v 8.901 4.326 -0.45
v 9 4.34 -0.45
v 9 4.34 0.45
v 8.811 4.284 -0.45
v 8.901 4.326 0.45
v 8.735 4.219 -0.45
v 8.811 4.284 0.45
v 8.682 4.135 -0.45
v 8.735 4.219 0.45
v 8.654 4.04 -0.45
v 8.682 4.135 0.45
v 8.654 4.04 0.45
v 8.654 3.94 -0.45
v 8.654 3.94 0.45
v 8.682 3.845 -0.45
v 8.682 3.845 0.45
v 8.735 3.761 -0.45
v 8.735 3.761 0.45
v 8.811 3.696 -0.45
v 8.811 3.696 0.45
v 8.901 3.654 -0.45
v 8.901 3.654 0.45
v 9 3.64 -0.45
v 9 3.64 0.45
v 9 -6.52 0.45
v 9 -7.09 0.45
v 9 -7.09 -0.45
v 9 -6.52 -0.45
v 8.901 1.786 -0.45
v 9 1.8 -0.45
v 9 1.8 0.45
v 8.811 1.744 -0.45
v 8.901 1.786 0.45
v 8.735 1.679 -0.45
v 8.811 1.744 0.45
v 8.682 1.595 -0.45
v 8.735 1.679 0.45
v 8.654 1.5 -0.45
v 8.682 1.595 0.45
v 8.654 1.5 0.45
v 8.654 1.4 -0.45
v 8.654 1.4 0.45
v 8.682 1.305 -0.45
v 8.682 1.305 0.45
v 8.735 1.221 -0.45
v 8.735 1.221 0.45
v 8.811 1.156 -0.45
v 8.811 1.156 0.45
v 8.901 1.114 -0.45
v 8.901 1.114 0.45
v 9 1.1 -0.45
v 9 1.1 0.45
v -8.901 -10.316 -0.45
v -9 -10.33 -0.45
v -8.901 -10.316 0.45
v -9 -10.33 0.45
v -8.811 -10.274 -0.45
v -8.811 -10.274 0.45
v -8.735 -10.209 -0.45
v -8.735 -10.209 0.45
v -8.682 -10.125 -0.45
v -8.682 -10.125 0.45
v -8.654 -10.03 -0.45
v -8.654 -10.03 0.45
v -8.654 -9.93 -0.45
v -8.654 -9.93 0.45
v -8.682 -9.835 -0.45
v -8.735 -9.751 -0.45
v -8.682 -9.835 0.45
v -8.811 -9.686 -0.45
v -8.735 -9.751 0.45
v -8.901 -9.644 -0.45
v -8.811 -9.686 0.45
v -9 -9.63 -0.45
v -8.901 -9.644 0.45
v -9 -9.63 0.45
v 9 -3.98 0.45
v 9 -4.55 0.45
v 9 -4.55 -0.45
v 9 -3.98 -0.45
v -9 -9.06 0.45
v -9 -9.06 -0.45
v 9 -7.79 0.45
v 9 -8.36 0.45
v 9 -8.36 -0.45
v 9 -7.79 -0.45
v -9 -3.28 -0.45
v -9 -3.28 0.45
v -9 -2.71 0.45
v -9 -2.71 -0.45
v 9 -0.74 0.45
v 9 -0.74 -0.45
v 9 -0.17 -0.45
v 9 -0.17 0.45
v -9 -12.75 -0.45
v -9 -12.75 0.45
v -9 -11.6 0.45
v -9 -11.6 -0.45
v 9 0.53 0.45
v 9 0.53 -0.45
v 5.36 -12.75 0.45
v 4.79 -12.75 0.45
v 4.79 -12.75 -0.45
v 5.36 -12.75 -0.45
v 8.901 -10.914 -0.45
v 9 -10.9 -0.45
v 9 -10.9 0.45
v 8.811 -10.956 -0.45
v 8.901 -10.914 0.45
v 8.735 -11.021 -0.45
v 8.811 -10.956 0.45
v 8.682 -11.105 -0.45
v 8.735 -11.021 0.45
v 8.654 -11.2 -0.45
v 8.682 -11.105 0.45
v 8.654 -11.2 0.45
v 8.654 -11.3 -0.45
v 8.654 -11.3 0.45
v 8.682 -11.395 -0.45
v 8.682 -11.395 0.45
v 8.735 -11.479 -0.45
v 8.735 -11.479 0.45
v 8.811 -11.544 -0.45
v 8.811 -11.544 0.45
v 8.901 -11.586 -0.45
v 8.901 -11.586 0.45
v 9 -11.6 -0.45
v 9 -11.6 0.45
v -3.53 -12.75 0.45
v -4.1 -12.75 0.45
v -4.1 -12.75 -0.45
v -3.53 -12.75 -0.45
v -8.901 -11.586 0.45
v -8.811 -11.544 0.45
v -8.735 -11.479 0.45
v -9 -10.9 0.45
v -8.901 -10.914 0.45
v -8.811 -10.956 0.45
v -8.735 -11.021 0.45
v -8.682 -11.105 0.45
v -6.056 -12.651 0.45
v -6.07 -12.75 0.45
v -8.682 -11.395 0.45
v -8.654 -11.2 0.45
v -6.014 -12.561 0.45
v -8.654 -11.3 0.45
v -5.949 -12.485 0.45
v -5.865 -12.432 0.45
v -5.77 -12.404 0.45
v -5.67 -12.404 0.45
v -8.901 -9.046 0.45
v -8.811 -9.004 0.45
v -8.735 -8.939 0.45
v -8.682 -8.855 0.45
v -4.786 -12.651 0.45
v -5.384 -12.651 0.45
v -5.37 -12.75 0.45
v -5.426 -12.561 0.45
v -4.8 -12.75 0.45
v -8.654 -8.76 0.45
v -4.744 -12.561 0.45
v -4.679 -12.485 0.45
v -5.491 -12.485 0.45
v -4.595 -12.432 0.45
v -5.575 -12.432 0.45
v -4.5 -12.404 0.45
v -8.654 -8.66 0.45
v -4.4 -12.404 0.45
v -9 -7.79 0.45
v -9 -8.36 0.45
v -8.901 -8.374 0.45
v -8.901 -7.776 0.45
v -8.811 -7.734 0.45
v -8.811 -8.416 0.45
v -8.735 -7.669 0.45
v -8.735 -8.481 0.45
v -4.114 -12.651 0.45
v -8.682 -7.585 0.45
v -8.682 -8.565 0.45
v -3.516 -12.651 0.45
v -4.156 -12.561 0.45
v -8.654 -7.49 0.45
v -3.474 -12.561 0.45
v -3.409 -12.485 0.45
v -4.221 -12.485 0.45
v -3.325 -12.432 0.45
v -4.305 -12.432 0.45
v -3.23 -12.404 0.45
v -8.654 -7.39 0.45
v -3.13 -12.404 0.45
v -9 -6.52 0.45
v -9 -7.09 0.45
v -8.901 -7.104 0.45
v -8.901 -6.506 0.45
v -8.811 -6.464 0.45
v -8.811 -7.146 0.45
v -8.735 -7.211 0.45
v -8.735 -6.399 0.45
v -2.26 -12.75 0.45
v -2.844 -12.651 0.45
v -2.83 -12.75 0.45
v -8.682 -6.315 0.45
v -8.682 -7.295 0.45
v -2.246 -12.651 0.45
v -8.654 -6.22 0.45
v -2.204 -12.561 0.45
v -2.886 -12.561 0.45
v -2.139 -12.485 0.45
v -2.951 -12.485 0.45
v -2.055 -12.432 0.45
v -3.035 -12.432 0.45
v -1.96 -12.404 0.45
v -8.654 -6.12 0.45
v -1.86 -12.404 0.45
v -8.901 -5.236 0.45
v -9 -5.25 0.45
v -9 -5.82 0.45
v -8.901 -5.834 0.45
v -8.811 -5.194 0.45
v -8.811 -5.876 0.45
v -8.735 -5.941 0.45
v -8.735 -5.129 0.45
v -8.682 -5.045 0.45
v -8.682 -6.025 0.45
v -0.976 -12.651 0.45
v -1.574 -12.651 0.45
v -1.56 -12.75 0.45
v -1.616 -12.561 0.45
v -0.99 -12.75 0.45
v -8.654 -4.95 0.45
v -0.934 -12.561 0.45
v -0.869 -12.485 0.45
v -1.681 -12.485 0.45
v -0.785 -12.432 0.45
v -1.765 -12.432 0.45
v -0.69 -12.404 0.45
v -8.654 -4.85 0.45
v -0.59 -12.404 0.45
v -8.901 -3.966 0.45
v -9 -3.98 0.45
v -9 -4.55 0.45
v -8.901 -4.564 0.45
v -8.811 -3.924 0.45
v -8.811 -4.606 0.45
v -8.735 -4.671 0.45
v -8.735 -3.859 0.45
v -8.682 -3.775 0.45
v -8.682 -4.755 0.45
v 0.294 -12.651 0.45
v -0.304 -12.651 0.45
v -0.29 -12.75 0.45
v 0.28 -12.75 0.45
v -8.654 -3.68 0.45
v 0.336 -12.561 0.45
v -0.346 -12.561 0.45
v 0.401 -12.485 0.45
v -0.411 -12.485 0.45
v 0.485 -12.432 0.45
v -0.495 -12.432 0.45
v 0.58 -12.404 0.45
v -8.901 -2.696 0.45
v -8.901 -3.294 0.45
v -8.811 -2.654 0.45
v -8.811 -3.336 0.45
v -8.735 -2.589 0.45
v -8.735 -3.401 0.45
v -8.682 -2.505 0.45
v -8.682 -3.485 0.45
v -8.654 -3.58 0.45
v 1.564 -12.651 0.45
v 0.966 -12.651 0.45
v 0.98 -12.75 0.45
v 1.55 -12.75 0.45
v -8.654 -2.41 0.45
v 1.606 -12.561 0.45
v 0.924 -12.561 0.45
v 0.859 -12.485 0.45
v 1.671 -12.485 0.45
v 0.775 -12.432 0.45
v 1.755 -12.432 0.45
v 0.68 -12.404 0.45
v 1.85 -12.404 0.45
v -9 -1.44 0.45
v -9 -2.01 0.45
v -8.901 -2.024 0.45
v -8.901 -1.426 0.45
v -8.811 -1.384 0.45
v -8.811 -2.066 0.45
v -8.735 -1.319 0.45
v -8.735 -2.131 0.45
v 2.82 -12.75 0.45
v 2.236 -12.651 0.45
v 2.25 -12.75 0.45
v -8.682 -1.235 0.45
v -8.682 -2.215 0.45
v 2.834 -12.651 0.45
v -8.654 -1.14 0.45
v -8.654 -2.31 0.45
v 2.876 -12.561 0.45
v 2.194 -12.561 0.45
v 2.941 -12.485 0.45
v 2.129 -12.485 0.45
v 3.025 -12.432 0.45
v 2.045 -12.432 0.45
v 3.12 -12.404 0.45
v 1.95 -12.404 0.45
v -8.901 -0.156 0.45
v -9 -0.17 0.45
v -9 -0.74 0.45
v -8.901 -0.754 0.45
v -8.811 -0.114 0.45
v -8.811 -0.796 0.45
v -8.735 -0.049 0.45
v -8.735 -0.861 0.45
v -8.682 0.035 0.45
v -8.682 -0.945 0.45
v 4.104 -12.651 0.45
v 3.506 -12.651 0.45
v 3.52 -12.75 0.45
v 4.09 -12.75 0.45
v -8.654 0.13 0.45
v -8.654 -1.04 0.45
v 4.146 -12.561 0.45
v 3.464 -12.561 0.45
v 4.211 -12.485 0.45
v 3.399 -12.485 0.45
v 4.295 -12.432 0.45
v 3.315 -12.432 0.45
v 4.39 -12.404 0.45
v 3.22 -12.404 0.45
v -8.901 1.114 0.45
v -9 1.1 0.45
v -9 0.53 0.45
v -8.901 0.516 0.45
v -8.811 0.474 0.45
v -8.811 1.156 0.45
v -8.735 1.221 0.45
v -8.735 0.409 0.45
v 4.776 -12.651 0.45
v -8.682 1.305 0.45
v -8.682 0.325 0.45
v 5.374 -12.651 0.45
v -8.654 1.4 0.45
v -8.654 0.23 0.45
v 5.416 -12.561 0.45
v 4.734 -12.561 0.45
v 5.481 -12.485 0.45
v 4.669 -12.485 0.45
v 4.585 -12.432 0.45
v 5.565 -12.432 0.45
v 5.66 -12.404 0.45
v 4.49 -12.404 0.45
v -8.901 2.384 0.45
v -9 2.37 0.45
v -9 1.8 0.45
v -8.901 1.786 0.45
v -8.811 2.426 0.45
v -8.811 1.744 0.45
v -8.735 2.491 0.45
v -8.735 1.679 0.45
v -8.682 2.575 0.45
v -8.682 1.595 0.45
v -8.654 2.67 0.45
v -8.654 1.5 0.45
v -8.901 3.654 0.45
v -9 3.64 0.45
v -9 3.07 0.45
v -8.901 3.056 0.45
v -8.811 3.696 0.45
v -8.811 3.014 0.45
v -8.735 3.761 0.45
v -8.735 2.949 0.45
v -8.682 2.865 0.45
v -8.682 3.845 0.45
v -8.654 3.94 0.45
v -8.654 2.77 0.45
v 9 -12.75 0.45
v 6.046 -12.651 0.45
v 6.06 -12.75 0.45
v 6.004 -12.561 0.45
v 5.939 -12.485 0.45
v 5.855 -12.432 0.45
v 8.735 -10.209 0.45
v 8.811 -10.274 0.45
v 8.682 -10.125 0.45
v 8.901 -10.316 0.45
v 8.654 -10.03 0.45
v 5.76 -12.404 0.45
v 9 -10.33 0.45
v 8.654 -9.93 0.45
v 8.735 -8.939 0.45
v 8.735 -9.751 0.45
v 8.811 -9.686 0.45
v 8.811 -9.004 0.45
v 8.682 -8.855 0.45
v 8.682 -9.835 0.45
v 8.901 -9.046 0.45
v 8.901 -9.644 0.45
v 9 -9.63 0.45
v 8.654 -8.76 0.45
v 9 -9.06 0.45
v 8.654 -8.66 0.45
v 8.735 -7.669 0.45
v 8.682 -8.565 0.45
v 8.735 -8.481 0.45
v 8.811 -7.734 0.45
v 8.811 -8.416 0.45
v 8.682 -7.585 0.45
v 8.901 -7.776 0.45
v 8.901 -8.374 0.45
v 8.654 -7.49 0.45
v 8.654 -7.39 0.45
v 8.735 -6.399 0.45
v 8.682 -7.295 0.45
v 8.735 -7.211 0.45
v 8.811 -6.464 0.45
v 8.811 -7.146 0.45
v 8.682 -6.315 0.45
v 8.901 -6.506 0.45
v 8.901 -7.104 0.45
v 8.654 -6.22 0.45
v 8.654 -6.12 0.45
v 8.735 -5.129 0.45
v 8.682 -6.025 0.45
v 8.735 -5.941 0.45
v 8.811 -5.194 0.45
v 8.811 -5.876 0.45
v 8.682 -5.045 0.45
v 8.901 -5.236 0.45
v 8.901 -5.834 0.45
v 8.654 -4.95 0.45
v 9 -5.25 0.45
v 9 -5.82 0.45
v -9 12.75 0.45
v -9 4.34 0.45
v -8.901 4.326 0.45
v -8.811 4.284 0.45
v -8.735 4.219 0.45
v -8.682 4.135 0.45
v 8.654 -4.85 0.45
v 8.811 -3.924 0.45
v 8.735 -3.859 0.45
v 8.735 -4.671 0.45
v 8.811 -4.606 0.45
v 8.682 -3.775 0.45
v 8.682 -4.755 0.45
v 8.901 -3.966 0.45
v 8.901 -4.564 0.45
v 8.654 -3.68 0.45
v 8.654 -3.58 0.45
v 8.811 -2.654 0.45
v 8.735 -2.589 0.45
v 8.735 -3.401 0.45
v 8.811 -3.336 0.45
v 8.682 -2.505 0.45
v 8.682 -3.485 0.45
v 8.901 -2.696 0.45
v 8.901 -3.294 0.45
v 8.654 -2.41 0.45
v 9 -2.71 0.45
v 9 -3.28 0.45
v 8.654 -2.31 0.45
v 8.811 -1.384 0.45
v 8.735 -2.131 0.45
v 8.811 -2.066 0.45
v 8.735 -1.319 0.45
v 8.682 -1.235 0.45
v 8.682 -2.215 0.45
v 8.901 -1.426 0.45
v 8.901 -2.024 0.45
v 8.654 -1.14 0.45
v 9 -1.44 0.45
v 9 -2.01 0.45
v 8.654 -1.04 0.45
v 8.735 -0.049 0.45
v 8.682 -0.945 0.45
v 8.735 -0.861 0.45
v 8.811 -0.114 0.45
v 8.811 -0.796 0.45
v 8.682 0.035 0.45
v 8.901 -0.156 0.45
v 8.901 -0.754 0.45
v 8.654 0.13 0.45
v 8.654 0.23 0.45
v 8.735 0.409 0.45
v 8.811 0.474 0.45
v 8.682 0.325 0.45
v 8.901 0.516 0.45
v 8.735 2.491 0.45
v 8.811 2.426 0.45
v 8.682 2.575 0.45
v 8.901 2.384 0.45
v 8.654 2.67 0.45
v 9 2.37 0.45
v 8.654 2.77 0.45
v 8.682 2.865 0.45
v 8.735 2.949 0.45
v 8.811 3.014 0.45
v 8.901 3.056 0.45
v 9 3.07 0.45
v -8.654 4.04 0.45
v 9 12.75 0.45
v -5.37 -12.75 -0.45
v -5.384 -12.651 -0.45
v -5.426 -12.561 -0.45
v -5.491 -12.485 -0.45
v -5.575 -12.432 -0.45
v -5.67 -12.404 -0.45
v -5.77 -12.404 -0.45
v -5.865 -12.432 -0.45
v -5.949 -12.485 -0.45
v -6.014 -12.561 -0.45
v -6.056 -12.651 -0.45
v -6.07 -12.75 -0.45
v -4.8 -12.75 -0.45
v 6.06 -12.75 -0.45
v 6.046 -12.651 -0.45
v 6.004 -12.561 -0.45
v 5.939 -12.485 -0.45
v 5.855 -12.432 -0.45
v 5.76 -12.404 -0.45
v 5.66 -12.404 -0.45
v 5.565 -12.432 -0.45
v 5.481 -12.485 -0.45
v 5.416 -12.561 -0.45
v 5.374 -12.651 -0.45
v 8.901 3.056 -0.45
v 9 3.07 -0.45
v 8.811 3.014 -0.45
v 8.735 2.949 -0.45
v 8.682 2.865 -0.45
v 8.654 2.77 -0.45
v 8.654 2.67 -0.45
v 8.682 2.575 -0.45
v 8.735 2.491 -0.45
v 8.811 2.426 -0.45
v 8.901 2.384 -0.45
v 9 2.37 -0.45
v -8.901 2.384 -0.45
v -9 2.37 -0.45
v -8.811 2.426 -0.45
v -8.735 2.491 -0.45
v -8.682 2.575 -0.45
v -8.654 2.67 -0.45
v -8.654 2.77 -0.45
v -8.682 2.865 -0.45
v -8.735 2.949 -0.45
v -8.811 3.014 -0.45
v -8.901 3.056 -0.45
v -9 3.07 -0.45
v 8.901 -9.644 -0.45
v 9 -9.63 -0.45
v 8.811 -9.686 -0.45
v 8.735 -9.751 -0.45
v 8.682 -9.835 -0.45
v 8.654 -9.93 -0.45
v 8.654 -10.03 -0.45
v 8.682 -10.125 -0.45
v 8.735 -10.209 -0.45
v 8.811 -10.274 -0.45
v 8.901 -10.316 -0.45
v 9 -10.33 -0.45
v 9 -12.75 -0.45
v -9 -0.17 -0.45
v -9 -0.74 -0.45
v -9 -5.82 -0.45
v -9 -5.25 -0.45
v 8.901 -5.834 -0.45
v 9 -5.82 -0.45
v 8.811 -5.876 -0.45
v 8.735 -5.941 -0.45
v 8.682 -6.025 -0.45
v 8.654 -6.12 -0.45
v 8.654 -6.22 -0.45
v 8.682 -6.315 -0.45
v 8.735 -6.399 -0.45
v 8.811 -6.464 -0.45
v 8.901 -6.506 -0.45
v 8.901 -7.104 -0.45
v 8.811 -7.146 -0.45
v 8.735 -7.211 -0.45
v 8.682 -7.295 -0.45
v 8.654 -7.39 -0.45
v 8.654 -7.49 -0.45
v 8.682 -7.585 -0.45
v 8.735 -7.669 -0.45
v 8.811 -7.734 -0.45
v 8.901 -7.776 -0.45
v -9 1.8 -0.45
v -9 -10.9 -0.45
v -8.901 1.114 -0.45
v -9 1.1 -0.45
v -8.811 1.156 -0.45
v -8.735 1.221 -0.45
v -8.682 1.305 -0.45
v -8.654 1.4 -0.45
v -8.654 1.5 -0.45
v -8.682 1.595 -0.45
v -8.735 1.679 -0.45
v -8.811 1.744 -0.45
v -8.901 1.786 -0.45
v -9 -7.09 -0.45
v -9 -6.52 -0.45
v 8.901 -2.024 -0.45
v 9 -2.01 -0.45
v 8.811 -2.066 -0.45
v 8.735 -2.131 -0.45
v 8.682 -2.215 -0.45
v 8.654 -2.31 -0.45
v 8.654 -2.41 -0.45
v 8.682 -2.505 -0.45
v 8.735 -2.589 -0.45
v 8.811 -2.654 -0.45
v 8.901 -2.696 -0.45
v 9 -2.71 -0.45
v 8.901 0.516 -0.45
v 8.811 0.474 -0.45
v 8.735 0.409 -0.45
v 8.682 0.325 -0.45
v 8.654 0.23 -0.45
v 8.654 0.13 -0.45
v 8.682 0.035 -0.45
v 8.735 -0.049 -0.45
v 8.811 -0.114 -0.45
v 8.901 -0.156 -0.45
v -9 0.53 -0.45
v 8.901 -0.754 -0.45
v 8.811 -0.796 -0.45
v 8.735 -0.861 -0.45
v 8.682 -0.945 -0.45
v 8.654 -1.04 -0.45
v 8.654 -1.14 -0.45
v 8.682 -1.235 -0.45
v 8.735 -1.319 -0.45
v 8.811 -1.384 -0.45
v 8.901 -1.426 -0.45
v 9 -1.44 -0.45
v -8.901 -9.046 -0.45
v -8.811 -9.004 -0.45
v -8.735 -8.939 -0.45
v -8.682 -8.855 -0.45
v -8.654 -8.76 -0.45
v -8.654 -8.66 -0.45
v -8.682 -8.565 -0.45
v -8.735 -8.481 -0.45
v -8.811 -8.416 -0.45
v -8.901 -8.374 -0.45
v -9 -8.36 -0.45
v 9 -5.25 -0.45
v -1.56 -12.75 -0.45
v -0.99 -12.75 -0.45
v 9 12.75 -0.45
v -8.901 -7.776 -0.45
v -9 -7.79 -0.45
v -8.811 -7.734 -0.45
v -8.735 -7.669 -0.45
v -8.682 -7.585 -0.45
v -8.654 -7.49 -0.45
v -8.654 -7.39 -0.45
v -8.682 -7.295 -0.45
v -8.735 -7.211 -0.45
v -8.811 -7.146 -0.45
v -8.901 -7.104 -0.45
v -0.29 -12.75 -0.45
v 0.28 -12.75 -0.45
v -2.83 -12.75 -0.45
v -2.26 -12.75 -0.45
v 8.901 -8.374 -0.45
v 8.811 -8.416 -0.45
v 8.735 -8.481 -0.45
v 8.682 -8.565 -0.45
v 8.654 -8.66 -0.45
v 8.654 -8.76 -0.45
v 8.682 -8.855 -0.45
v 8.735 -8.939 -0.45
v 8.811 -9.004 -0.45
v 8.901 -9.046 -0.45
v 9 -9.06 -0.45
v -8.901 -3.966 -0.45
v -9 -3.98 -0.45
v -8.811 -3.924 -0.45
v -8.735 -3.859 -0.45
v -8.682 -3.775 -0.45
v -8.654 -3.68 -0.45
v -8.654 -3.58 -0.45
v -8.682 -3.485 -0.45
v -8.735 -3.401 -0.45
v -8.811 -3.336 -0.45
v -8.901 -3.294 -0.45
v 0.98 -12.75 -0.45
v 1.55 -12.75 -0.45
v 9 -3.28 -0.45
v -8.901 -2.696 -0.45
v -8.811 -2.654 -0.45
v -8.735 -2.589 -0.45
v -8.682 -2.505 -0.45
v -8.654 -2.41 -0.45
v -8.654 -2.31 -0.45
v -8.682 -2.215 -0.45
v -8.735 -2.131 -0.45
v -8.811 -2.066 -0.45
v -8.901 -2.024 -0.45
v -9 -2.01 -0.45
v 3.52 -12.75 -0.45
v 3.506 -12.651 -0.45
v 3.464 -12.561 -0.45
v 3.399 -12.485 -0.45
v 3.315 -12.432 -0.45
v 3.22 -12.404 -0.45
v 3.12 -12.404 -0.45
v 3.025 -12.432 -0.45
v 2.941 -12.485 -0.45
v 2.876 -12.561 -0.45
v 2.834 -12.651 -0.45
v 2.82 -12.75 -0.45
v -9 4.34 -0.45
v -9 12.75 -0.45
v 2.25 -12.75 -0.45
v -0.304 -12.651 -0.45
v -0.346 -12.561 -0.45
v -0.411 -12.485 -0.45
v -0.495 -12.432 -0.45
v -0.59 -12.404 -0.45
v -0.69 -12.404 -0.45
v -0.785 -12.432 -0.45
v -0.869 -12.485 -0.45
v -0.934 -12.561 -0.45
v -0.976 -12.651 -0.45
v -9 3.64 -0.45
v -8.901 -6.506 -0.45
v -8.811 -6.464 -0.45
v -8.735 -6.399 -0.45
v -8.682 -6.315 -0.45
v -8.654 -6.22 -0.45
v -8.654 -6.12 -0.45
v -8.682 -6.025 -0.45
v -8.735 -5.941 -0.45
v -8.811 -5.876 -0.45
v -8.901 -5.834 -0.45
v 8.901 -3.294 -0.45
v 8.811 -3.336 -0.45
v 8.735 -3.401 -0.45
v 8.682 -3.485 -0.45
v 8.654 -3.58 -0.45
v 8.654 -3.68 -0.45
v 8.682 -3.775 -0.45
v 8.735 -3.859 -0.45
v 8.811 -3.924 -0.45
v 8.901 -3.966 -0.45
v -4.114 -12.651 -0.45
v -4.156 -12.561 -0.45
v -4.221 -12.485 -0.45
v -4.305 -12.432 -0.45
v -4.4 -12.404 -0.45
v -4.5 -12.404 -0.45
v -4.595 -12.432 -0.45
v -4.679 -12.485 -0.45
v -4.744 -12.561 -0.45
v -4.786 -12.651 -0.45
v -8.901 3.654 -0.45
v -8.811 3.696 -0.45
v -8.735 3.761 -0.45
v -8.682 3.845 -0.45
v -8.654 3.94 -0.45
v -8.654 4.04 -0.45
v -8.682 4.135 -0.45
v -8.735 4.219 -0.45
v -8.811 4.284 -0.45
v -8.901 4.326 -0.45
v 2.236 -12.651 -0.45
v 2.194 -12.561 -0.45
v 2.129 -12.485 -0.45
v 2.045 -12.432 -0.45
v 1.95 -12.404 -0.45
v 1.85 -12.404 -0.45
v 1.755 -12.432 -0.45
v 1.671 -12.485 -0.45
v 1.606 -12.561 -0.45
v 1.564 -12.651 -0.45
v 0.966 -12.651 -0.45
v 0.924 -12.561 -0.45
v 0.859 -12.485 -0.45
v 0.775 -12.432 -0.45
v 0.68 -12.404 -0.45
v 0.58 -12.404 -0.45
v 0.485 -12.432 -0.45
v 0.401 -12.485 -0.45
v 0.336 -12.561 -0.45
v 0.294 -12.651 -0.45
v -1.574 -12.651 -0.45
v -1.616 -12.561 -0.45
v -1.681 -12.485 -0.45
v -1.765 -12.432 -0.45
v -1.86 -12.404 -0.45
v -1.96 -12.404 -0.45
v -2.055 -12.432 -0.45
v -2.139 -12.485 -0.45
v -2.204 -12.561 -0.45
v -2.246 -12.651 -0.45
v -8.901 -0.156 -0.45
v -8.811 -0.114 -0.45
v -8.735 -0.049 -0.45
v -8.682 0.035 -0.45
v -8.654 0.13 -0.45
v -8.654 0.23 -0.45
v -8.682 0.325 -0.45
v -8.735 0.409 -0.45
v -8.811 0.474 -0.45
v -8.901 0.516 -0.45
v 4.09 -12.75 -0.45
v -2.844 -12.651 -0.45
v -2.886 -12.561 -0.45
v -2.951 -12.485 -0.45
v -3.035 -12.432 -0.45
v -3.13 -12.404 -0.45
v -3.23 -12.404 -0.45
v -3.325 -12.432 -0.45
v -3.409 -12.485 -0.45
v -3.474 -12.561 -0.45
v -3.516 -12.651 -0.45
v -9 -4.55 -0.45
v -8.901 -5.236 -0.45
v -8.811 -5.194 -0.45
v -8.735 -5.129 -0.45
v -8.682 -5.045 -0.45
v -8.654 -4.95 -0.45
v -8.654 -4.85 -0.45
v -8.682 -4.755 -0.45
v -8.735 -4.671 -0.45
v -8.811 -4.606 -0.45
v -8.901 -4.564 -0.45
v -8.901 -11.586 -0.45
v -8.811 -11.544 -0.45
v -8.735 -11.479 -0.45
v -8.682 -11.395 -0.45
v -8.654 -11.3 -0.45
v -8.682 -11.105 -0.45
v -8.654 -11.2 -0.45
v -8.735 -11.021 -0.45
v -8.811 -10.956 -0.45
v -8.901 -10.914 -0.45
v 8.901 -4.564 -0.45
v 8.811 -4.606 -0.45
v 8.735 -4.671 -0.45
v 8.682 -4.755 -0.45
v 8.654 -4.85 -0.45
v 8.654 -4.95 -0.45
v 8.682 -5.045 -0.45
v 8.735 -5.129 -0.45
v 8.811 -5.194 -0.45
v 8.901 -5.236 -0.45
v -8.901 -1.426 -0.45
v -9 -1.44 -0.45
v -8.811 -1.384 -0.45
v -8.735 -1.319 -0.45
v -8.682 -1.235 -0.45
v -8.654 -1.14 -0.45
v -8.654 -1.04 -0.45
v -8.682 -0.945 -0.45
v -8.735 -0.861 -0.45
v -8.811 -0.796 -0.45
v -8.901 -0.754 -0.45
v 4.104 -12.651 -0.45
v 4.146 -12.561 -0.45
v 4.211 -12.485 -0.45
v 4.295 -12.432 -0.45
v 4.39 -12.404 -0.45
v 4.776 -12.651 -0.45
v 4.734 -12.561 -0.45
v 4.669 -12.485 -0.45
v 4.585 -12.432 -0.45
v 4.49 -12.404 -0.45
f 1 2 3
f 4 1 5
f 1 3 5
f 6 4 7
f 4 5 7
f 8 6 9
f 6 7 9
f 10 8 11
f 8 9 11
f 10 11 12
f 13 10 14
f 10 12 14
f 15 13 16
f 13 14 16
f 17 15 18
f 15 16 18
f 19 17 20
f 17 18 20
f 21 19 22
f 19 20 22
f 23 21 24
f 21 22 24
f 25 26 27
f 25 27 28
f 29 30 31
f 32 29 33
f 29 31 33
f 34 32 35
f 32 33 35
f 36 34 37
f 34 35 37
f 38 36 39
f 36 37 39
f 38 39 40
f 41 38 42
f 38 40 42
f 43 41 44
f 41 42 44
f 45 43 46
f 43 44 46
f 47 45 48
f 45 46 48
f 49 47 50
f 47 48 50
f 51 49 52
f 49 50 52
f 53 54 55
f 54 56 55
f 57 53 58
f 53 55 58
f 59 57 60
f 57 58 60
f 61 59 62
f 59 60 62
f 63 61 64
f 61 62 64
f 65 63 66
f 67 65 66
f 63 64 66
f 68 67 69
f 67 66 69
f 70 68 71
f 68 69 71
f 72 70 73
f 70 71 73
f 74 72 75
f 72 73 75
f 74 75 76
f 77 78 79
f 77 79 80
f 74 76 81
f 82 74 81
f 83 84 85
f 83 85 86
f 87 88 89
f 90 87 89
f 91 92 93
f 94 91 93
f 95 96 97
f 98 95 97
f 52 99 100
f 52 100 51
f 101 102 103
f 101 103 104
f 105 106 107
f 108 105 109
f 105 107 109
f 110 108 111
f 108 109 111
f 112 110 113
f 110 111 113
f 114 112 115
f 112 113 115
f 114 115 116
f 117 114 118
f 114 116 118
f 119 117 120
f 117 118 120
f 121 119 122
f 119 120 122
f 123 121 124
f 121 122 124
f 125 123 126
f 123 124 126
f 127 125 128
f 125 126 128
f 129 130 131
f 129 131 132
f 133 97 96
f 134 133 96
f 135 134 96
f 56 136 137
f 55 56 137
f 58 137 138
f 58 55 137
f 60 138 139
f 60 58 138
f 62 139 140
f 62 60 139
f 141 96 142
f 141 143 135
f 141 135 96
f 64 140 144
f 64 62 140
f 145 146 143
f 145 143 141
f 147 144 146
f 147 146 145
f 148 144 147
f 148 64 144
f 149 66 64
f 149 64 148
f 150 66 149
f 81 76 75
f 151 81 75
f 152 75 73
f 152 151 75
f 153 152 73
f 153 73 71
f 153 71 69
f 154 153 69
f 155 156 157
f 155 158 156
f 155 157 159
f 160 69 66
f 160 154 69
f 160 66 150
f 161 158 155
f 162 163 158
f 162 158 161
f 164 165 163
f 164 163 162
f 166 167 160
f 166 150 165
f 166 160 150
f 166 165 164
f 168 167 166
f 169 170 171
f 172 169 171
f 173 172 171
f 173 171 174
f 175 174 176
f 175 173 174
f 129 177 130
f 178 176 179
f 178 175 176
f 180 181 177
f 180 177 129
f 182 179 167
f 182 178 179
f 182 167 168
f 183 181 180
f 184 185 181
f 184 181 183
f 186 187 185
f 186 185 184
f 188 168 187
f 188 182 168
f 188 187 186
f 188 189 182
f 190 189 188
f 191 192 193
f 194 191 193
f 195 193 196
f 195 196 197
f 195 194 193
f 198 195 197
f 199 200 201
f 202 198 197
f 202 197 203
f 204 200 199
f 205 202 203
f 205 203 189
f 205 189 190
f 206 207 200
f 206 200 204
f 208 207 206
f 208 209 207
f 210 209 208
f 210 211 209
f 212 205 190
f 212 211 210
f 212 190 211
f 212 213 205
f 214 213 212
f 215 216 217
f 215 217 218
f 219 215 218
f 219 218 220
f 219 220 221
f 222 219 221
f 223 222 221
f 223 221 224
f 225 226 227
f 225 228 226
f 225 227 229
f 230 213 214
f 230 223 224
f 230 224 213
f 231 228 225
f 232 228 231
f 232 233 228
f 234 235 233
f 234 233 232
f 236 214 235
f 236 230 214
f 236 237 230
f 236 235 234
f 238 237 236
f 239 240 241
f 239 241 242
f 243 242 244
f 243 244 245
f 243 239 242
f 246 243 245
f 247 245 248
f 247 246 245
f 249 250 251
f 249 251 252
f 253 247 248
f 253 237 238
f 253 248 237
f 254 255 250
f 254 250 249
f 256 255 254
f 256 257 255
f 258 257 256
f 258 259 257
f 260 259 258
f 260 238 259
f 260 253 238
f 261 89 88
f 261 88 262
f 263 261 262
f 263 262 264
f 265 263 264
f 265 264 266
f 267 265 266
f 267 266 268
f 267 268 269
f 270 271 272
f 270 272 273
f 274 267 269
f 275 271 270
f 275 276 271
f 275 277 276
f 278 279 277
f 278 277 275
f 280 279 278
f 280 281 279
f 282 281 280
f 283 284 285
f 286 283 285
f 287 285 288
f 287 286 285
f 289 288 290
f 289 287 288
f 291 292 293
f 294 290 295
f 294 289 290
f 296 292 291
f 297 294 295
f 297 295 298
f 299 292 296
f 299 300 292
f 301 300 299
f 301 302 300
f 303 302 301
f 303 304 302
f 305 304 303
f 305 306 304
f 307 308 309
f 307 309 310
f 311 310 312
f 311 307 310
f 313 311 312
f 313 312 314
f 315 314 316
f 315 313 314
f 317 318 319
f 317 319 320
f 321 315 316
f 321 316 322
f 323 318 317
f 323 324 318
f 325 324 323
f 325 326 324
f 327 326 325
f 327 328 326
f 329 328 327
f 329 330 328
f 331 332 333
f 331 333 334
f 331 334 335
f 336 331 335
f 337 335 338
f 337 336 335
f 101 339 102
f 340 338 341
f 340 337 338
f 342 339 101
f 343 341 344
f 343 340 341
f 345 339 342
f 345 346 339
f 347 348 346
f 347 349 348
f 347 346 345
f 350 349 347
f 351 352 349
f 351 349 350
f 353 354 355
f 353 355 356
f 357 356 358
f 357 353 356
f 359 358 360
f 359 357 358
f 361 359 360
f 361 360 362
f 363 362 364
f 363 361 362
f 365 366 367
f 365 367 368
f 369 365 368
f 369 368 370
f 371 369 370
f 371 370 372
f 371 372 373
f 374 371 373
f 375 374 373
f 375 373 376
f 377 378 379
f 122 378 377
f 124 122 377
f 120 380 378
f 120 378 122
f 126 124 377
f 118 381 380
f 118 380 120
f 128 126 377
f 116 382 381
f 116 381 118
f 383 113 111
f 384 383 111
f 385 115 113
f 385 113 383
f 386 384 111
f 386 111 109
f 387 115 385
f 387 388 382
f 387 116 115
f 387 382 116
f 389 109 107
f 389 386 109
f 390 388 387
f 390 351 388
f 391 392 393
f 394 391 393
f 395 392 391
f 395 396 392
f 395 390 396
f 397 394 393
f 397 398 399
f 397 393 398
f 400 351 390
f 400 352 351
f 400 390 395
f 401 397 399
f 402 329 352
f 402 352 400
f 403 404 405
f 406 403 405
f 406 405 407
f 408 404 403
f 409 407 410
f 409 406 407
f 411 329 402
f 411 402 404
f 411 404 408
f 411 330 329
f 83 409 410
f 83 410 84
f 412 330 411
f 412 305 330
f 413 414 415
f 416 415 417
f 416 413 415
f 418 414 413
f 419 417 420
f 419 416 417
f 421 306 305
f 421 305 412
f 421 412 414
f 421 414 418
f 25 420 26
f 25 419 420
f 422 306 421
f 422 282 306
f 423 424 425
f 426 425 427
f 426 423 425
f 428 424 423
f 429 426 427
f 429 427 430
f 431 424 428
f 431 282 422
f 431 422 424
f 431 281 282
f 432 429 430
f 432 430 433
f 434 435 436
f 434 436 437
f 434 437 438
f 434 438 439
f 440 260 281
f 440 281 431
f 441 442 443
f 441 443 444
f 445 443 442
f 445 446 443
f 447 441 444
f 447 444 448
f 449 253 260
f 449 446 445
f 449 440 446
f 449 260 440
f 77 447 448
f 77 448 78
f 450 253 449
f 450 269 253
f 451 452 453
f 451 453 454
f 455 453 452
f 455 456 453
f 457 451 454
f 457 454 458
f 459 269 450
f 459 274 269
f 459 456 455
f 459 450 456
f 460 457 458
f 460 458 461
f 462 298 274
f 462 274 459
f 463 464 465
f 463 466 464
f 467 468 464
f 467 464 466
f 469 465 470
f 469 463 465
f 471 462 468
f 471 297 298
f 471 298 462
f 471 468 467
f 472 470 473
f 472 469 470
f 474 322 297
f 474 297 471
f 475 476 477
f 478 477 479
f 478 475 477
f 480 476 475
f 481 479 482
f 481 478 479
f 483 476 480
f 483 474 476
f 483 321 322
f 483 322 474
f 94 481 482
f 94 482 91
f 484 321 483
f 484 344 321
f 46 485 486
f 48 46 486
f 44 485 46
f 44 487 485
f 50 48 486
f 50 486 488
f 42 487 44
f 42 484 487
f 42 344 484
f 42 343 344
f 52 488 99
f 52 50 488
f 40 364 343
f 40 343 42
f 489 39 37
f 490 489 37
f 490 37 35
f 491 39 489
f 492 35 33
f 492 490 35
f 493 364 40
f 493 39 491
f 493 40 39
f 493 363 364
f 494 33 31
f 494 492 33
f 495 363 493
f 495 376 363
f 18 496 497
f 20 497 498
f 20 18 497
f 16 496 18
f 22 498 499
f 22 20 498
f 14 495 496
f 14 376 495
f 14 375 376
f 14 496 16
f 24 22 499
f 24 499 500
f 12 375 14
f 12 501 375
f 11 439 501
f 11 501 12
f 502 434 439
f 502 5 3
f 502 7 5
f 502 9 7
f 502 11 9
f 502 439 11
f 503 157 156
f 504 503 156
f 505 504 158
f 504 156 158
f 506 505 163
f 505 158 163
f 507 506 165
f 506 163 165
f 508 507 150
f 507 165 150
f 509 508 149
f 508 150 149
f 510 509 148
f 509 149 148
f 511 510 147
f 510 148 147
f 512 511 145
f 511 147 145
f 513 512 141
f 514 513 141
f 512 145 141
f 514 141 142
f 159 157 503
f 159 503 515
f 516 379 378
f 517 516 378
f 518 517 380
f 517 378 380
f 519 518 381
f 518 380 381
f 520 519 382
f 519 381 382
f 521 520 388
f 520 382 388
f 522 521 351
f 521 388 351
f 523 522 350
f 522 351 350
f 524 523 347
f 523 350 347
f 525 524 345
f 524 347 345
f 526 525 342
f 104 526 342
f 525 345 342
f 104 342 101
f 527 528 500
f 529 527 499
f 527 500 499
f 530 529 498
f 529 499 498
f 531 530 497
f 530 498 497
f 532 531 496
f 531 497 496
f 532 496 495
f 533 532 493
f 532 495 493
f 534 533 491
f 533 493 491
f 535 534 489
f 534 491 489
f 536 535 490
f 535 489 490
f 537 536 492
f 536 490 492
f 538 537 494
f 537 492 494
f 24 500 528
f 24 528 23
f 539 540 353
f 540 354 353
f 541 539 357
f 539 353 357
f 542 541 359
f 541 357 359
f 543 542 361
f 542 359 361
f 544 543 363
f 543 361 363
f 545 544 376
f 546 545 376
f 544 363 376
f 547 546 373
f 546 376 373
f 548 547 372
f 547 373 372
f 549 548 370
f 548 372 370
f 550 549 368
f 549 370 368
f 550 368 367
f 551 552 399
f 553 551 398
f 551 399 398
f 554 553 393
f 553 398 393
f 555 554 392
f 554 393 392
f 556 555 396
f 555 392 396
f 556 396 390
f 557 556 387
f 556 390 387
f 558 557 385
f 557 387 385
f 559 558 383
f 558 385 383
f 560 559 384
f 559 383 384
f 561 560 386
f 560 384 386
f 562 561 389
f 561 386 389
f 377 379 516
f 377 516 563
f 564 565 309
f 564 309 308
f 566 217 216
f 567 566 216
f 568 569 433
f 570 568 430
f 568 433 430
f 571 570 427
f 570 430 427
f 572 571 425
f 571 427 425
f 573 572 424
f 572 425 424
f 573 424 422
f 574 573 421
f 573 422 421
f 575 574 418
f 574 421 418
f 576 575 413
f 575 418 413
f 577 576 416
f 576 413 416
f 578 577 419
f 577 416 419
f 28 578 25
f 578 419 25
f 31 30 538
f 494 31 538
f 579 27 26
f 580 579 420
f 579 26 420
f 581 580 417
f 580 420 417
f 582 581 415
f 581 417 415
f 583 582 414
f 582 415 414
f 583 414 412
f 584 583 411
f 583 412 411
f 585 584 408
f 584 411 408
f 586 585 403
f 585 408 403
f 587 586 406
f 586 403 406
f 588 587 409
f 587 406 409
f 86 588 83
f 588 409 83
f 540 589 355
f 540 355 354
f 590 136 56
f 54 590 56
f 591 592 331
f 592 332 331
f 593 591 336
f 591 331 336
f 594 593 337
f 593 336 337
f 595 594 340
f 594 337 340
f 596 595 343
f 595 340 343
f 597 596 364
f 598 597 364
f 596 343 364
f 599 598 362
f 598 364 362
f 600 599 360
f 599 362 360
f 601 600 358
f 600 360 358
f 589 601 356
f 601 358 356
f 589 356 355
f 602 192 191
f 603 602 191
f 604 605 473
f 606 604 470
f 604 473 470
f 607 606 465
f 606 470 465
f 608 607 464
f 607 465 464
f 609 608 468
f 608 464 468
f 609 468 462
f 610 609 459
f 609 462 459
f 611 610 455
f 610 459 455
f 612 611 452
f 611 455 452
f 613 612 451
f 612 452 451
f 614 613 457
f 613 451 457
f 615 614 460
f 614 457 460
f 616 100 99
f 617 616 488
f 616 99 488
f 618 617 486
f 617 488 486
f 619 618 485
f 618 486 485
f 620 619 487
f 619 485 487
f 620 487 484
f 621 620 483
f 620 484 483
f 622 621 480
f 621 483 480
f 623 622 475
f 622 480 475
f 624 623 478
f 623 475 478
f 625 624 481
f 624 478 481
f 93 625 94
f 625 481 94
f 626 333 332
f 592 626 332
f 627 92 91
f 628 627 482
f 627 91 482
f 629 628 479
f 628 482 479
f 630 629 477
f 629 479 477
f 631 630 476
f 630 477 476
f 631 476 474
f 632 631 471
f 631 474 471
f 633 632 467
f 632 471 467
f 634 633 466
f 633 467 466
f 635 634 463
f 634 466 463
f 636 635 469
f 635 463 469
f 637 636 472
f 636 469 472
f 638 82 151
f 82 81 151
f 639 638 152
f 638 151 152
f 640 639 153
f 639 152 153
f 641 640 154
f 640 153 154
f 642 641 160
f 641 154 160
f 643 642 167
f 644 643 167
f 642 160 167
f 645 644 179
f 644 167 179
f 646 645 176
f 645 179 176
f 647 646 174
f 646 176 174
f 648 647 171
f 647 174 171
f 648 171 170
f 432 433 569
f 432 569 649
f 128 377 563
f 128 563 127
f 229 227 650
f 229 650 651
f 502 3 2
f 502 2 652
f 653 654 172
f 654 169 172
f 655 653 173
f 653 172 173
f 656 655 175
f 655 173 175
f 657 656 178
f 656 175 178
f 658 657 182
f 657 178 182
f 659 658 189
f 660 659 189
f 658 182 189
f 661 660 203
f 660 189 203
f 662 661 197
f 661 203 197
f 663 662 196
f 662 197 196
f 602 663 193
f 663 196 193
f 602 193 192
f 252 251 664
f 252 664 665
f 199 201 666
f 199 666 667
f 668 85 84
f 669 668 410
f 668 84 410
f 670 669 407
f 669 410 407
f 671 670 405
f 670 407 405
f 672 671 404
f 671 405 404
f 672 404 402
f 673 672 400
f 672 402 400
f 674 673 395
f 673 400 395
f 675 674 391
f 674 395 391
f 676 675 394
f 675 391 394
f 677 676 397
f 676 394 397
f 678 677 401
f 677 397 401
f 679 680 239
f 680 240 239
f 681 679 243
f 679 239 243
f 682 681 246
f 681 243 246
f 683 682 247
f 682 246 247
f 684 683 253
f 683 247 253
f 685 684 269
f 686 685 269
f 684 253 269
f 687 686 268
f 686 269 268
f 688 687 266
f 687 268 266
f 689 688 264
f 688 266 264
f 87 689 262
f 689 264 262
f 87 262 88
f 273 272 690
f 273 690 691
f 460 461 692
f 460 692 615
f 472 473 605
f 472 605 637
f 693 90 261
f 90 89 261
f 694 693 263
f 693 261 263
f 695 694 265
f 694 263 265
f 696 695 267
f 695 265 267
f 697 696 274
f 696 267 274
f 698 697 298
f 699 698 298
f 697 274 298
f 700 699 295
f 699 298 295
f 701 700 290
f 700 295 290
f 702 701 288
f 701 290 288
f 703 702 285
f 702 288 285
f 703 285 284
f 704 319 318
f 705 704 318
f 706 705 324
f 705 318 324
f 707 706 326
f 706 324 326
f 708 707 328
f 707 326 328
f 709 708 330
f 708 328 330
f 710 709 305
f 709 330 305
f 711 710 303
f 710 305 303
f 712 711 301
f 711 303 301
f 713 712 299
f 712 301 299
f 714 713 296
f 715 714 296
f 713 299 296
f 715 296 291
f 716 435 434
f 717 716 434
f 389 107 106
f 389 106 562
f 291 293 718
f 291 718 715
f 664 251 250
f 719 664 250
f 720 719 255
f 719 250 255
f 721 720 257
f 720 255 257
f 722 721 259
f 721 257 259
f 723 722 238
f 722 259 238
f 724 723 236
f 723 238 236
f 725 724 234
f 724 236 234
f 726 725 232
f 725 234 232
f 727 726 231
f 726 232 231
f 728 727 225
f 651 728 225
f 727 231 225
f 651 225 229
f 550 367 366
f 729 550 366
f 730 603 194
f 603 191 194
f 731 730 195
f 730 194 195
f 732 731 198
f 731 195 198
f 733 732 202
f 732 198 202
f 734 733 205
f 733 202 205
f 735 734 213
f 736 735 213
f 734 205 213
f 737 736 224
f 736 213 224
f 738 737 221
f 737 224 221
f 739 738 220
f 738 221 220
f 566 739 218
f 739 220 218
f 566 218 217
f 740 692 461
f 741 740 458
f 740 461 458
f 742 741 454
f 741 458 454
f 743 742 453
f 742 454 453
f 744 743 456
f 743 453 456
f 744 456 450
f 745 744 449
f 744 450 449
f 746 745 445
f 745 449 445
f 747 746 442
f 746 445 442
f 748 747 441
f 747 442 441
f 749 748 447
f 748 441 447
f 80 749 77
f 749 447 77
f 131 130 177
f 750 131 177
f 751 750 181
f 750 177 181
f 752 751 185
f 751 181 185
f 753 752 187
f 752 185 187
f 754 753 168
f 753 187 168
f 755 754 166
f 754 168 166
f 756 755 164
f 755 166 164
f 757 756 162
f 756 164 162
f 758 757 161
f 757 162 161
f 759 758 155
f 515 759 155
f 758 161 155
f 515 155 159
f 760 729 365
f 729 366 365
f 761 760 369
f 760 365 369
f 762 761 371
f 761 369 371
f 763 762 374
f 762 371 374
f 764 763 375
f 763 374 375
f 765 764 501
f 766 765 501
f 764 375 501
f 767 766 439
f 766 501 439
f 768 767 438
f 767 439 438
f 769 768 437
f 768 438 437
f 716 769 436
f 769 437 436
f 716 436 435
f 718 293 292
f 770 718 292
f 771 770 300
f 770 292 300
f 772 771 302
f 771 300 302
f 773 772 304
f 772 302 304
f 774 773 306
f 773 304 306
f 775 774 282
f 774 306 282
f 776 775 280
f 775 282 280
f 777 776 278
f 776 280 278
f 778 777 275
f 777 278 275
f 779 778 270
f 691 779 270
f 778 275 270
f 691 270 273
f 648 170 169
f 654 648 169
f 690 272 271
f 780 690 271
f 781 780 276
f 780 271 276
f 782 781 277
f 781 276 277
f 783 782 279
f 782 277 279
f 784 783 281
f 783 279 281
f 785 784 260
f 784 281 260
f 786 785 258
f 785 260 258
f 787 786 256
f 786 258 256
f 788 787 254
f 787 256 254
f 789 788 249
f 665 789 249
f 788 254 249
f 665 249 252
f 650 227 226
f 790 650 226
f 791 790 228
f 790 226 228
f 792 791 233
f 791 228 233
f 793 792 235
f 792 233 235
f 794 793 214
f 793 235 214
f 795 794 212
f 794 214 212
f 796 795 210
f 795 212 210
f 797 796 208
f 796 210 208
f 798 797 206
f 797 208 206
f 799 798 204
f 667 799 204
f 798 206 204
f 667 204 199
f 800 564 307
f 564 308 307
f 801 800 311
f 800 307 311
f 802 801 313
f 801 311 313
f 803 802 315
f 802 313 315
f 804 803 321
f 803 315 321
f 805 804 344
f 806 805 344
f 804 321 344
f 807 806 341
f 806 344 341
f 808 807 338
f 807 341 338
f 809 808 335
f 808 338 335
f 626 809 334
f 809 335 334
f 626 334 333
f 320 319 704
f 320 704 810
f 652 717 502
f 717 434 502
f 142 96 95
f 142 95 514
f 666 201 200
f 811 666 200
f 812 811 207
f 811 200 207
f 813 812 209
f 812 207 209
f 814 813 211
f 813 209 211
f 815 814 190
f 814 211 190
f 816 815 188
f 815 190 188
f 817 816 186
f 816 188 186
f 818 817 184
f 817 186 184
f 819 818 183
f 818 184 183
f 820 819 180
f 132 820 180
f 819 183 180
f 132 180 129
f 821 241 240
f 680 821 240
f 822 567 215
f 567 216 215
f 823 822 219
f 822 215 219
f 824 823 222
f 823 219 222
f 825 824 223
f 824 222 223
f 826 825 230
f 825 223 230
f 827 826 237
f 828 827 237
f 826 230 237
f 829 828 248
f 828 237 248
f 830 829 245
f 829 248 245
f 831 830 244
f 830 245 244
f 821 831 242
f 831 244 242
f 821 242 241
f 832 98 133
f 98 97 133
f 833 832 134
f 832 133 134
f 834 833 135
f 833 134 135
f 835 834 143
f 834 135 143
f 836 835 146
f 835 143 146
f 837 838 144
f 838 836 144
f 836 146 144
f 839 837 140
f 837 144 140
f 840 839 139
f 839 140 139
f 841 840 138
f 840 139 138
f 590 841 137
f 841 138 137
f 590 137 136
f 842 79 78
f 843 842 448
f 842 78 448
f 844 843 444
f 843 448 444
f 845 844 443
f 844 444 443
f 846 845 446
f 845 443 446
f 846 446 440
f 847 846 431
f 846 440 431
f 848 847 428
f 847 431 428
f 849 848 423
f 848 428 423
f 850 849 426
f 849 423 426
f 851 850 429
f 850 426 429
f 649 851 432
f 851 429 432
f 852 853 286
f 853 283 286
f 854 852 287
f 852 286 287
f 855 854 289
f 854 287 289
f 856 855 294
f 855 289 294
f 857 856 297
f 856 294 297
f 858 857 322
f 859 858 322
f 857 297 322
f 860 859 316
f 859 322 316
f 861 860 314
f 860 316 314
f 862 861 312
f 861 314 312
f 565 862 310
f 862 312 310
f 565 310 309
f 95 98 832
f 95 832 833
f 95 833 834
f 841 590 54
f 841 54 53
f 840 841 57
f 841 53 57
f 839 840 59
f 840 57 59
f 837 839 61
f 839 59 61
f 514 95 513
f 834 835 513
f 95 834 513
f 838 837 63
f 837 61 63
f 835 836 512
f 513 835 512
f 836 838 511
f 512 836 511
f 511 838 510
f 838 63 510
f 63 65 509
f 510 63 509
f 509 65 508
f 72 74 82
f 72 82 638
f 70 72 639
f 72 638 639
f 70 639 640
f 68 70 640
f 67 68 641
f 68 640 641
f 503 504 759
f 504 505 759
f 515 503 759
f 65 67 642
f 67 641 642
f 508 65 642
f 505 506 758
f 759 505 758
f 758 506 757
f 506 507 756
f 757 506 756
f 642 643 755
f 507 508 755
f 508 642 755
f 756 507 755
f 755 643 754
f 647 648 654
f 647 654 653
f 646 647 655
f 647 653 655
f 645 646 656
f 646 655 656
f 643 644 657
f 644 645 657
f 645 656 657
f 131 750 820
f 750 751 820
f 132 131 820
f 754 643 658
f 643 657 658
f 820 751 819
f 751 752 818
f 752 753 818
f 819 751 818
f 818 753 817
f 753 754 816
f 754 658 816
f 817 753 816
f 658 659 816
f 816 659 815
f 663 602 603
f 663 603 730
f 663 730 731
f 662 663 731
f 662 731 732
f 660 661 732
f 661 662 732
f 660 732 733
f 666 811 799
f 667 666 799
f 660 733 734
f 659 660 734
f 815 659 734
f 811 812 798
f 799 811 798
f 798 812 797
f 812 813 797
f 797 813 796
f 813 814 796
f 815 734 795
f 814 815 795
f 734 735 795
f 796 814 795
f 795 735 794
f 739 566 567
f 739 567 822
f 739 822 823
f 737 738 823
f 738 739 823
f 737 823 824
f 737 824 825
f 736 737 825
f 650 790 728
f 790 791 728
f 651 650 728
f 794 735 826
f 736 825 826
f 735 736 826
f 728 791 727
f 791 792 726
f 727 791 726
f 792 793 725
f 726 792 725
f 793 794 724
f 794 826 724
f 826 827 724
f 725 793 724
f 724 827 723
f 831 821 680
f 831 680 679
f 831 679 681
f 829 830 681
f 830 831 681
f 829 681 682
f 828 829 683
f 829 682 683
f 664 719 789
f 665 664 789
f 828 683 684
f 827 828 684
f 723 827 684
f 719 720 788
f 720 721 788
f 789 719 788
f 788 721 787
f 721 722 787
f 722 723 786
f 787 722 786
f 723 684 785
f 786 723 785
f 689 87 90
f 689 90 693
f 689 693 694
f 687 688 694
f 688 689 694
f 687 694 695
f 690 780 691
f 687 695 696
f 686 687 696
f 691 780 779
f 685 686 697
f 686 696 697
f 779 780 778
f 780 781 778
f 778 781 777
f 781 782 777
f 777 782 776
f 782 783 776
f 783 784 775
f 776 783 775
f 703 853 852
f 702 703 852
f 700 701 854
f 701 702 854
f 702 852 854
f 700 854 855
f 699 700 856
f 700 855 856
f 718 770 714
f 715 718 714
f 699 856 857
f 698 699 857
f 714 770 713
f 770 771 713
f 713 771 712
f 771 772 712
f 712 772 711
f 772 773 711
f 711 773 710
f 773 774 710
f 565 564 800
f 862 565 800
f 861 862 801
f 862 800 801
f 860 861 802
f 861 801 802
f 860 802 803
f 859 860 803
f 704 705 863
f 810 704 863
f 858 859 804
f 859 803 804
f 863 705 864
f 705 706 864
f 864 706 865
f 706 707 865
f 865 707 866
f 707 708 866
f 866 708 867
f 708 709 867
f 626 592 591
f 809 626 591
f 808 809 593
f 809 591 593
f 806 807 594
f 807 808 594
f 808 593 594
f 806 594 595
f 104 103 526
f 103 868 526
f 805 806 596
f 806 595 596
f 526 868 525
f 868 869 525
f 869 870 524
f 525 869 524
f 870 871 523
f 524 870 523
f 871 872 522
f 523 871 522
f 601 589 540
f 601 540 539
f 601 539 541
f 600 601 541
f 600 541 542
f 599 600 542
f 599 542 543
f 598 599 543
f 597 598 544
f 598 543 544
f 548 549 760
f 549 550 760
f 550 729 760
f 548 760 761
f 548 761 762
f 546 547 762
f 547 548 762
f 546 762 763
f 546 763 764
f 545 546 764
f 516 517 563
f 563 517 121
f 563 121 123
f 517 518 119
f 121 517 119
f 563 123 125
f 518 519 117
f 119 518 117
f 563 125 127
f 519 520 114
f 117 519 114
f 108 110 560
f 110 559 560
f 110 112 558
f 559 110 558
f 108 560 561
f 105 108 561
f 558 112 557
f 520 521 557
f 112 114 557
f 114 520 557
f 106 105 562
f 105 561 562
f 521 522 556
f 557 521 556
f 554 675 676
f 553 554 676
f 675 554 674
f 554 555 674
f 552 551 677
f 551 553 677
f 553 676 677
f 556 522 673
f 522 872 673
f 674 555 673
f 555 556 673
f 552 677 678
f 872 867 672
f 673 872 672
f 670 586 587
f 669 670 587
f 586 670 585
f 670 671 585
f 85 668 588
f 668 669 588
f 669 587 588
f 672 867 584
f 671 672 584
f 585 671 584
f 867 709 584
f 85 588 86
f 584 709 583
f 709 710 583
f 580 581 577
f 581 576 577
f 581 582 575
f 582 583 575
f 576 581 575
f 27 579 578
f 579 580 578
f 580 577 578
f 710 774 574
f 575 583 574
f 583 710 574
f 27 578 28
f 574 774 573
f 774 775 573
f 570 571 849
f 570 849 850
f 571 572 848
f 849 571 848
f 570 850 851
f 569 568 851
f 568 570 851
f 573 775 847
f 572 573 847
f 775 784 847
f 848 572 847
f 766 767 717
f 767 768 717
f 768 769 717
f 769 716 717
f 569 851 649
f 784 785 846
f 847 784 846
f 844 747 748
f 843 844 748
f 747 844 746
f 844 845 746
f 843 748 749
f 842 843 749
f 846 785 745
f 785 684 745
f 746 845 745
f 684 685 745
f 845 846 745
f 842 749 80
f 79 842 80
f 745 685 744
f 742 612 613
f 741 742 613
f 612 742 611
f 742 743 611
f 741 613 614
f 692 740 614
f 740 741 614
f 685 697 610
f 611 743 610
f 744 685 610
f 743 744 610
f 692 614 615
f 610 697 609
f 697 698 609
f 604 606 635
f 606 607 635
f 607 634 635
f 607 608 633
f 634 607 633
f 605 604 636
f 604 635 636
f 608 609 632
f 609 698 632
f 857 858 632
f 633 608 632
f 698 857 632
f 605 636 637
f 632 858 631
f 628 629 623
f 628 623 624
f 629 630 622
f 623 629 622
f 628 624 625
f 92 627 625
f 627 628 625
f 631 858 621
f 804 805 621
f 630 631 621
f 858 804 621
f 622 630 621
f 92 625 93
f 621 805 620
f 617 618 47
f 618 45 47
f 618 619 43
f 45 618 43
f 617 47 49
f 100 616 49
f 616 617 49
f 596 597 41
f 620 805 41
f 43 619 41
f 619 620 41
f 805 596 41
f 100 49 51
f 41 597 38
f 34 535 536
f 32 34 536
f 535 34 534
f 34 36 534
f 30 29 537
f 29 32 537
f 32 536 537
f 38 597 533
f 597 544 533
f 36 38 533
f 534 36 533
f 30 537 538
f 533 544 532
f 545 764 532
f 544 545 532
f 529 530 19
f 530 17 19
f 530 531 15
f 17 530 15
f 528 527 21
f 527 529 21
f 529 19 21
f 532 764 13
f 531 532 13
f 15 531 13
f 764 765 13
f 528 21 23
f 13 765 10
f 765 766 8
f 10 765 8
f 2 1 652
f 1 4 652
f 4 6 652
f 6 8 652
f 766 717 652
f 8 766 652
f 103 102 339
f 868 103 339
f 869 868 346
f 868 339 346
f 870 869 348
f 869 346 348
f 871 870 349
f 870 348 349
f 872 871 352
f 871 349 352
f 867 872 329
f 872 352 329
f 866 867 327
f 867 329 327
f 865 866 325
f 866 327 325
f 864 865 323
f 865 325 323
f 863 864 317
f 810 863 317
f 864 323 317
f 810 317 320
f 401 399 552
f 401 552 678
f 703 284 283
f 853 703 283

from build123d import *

# Parameters (mm, degrees)
ESBO_O1_W                = 18
ESBO_O1_H                = 25.5
RESSALTO_EXTRUS_O1_DEPTH = 0.45
ESBO_O2_R                = 0.35
CORTE_EXTRUS_O1_DEPTH    = 16.632418239
ESBO_O3_R                = 0.35
CORTE_EXTRUS_O2_DEPTH    = 16.632418239


with BuildPart() as part:
    # Esboço1 → Ressalto-extrusão1 (new, symmetric)
    with BuildSketch(Plane.XY):
        Rectangle(ESBO_O1_W, ESBO_O1_H)
    extrude(amount=RESSALTO_EXTRUS_O1_DEPTH, both=True)

    # Esboço2 → Corte-extrusão1 (cut, through all)
    with BuildSketch(Plane.XY.offset(0.45)):
        with Locations((-5.72, -12.75)):
            Circle(ESBO_O2_R)
        with Locations((-4.45, -12.75)):
            Circle(ESBO_O2_R)
        with Locations((-3.18, -12.75)):
            Circle(ESBO_O2_R)
        with Locations((-1.91, -12.75)):
            Circle(ESBO_O2_R)
        with Locations((-0.64, -12.75)):
            Circle(ESBO_O2_R)
        with Locations((0.63, -12.75)):
            Circle(ESBO_O2_R)
        with Locations((1.9, -12.75)):
            Circle(ESBO_O2_R)
        with Locations((3.17, -12.75)):
            Circle(ESBO_O2_R)
        with Locations((4.44, -12.75)):
            Circle(ESBO_O2_R)
        with Locations((5.71, -12.75)):
            Circle(ESBO_O2_R)
    extrude(amount=-CORTE_EXTRUS_O1_DEPTH, mode=Mode.SUBTRACT)

    # Esboço3 → Corte-extrusão2 (cut, through all)
    with BuildSketch(Plane.XY.offset(0.45)):
        with Locations((-9, -11.25)):
            Circle(ESBO_O3_R)
        with Locations((-9, -9.98)):
            Circle(ESBO_O3_R)
        with Locations((-9, -8.71)):
            Circle(ESBO_O3_R)
        with Locations((-9, -7.44)):
            Circle(ESBO_O3_R)
        with Locations((-9, -6.17)):
            Circle(ESBO_O3_R)
        with Locations((-9, -4.9)):
            Circle(ESBO_O3_R)
        with Locations((-9, -3.63)):
            Circle(ESBO_O3_R)
        with Locations((-9, -2.36)):
            Circle(ESBO_O3_R)
        with Locations((-9, -1.09)):
            Circle(ESBO_O3_R)
        with Locations((-9, 0.18)):
            Circle(ESBO_O3_R)
        with Locations((-9, 1.45)):
            Circle(ESBO_O3_R)
        with Locations((-9, 2.72)):
            Circle(ESBO_O3_R)
        with Locations((-9, 3.99)):
            Circle(ESBO_O3_R)
        with Locations((9, 3.99)):
            Circle(ESBO_O3_R)
        with Locations((9, 2.72)):
            Circle(ESBO_O3_R)
        with Locations((9, 1.45)):
            Circle(ESBO_O3_R)
        with Locations((9, 0.18)):
            Circle(ESBO_O3_R)
        with Locations((9, -1.09)):
            Circle(ESBO_O3_R)
        with Locations((9, -2.36)):
            Circle(ESBO_O3_R)
        with Locations((9, -3.63)):
            Circle(ESBO_O3_R)
        with Locations((9, -4.9)):
            Circle(ESBO_O3_R)
        with Locations((9, -6.17)):
            Circle(ESBO_O3_R)
        with Locations((9, -7.44)):
            Circle(ESBO_O3_R)
        with Locations((9, -8.71)):
            Circle(ESBO_O3_R)
        with Locations((9, -9.98)):
            Circle(ESBO_O3_R)
        with Locations((9, -11.25)):
            Circle(ESBO_O3_R)
    extrude(amount=-CORTE_EXTRUS_O2_DEPTH, mode=Mode.SUBTRACT)


solid = part.part
